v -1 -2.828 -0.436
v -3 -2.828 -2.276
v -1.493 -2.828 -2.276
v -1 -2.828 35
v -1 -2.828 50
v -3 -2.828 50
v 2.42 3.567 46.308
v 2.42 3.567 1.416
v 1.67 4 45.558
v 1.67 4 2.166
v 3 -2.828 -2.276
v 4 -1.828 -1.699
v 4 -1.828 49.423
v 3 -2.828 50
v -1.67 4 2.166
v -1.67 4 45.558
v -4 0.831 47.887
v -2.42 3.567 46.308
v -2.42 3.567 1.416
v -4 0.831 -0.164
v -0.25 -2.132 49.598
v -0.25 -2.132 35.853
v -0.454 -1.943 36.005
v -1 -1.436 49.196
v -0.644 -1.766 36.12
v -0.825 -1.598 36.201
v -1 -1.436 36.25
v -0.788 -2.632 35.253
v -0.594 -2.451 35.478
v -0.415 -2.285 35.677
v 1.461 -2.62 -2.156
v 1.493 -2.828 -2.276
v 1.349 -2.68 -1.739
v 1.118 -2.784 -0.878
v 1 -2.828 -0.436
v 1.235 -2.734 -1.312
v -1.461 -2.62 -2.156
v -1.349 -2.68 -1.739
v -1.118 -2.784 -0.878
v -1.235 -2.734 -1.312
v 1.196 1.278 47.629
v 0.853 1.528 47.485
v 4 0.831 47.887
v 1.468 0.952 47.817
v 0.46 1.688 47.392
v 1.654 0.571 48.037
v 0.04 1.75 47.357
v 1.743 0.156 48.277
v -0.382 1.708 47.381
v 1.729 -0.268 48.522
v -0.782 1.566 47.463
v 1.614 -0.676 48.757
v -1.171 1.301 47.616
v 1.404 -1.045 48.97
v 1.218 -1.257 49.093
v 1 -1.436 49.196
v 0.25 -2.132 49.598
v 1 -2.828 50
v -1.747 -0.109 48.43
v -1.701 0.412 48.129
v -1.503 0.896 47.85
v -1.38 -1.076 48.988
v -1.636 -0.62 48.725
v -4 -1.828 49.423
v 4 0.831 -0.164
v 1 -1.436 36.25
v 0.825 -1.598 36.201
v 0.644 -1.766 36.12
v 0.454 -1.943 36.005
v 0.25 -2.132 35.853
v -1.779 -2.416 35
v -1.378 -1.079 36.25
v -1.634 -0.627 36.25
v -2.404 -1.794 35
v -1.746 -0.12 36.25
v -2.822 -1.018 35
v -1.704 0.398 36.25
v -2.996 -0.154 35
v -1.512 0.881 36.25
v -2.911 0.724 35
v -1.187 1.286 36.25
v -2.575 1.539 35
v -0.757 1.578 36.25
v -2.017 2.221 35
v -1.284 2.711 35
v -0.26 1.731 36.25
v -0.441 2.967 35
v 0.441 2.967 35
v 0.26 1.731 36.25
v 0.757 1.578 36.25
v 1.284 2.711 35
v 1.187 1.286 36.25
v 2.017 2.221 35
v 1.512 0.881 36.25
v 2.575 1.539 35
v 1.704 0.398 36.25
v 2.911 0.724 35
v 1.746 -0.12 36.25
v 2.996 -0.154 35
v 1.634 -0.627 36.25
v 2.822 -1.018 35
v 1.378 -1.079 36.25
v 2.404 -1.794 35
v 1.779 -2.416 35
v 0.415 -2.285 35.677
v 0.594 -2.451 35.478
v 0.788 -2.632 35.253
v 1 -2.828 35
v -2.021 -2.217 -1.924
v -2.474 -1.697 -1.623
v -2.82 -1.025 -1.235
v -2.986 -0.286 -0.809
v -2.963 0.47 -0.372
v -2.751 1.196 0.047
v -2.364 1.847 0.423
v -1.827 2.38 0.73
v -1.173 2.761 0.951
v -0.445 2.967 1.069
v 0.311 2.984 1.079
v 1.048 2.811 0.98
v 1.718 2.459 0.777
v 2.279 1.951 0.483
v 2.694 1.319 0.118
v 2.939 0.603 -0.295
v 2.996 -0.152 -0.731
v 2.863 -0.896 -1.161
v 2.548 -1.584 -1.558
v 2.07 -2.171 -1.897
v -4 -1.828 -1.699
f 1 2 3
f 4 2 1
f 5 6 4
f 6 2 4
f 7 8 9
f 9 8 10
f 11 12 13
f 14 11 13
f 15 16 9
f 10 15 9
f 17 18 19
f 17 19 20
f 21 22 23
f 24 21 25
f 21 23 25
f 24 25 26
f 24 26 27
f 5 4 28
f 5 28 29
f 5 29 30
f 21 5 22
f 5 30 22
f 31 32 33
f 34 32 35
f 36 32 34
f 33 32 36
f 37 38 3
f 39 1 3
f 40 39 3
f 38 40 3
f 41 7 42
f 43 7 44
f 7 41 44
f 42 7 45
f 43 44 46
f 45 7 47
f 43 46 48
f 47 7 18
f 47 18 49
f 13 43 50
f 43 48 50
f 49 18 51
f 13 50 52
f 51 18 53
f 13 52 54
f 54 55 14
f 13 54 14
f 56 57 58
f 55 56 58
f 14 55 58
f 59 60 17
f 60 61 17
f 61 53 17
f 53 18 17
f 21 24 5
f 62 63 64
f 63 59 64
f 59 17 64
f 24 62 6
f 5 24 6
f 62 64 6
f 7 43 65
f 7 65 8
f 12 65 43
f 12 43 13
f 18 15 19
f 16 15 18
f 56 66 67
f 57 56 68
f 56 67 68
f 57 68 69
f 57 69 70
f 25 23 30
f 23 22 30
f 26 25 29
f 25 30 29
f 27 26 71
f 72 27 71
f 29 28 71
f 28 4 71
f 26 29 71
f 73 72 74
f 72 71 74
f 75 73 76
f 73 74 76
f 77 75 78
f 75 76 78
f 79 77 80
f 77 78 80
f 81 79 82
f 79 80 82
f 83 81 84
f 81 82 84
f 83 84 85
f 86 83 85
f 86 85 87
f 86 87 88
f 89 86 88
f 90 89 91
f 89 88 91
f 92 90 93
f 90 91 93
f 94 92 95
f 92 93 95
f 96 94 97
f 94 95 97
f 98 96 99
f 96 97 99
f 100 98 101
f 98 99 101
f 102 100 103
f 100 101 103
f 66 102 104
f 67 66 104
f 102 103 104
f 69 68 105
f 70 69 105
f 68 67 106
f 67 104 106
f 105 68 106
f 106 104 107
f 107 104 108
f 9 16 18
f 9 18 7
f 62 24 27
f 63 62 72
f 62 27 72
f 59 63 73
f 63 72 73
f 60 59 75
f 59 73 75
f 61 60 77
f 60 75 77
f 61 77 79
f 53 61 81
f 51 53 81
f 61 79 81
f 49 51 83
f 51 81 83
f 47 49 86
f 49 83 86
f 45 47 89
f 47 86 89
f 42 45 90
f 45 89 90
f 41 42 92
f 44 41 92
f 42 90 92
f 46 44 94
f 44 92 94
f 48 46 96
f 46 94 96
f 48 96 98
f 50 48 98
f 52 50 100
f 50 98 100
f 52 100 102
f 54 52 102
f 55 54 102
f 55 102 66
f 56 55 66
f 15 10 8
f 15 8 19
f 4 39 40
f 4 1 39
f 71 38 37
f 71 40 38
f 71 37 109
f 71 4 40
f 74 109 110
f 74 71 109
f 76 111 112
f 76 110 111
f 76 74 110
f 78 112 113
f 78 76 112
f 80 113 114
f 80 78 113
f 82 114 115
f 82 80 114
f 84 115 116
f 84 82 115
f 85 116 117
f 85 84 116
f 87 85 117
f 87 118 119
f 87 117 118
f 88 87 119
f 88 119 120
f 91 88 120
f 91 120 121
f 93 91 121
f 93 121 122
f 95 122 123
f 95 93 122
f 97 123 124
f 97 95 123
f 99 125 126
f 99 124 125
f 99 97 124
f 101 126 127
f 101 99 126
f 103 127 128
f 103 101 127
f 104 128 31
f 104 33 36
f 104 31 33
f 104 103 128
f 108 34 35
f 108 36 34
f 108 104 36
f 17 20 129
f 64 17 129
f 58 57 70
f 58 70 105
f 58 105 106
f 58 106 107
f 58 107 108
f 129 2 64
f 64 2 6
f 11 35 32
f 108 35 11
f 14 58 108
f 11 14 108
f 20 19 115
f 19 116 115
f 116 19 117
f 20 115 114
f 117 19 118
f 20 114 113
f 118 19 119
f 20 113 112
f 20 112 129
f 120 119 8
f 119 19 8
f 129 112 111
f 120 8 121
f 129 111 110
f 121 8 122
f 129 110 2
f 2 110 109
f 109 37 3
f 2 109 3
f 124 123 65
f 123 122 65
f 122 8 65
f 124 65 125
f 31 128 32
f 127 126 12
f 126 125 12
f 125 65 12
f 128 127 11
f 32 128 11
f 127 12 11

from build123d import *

# Parameters (mm, degrees)
F1_DEPTH  = 20
F2_DEPTH  = 15
F3_W      = 8
F3_H      = 0.1715728753
F4_DEPTH  = 35.001
F6_DEPTH  = 15
F7_SIZE   = 1.24999
F8_DEPTH  = 7.9
F9_W      = 8
F9_H      = 6.8284271247
F10_DEPTH = 3
F13_DEPTH = 3
F15_DEPTH = 8.001
F17_DEPTH = 60.901
F19_DEPTH = 8.001
F20_SIZE  = 1
F21_SIZE  = 0.5


# Not quite as in the source:
# - a fillet or chamfer is up to 0.001 mm smaller than in the source, because OpenCascade refuses the exact size


with BuildPart() as f1:
    # F0 (on Top) → F1 (new body)
    with BuildSketch(Plane.XY):
        with BuildLine():
            ThreePointArc((-1, -2.8284271247), (0, 3), (1, -2.8284271247))
            Line((1, -2.8284271247), (1, -3))
            Line((1, -3), (4, -3))
            Line((4, -3), (4, 4))
            Line((4, 4), (0, 4))
            Line((0, 4), (-4, 4))
            Line((-4, 4), (-4, -3))
            Line((-4, -3), (-1, -3))
            Line((-1, -3), (-1, -2.8284271247))
        make_face()
    extrude(amount=F1_DEPTH)

    # F2 (add): a face of the model
    f2_faces = [f1.faces().sort_by_distance(p)[0] for p in [
        (0, 3.1063014581, 20),
    ]]
    extrude(f2_faces, amount=F2_DEPTH)

    # F3 (on face) → F4 (cut, through all)
    with BuildSketch(Plane.XY.offset(35)):
        with Locations((0, -2.9142135624)):
            Rectangle(F3_W, F3_H)
    extrude(amount=-F4_DEPTH, mode=Mode.SUBTRACT)

    # F5 (on face) → F6 (join)
    with BuildSketch(Plane.XY.offset(35)):
        with BuildLine():
            ThreePointArc((-1, -1.4361406616), (0, 1.75), (1, -1.4361406616))
            Line((1, -1.4361406616), (0.25, -2.1322838932))
            Line((0.25, -2.1322838932), (1, -2.8284271247))
            Line((1, -2.8284271247), (4, -2.8284271247))
            Line((4, -2.8284271247), (4, 4))
            Line((4, 4), (-4, 4))
            Line((-4, 4), (-4, -2.8284271247))
            Line((-4, -2.8284271247), (-1, -2.8284271247))
            Line((-1, -2.8284271247), (-0.25, -2.1322838932))
            Line((-0.25, -2.1322838932), (-1, -1.4361406616))
        make_face()
    extrude(amount=F6_DEPTH)

    # F7 (size 1.25 in the source; OpenCascade refuses exactly that, so slightly less here)
    f7_edges = [f1.edges().sort_by_distance(p)[0] for p in [
        (0, 1.75, 35),
    ]]
    chamfer(f7_edges, length=F7_SIZE)

    # F8 (add): a face of the model
    f8_faces = [f1.faces().sort_by_distance(p)[0] for p in [
        (-2.5, -2.7232475559, 0),
    ]]
    extrude(f8_faces, amount=F8_DEPTH)

    # F9 (on face) → F10 (join)
    with BuildSketch(Plane(origin=(0, 0, -7.9), x_dir=(1, 0, 0), z_dir=(0, 0, -1))):
        with Locations((0, -0.5857864376)):
            Rectangle(F9_W, F9_H)
    extrude(amount=F10_DEPTH)

    # F12 (on face) → F13 (cut)
    with BuildSketch(Plane.XZ.offset(2.8284271247)):
        Polygon((0, 3.2961524227), (-3, -7.9), (1, -7.9), (3, -7.9), align=None)
    extrude(amount=-F13_DEPTH, mode=Mode.SUBTRACT)

    # F14 (on face) → F15 (cut, through all)
    with BuildSketch(Plane(origin=(-4, 0, 0), x_dir=(0, -1, 0), z_dir=(-1, 0, 0))):
        Polygon((-4, 46.0576057614), (2.8284271247, 50), (-4, 50), align=None)
    extrude(amount=-F15_DEPTH, mode=Mode.SUBTRACT)

    # F16 (on face) → F17 (cut, through all)
    with BuildSketch(Plane(origin=(0, 0, -10.9), x_dir=(1, 0, 0), z_dir=(0, 0, -1))):
        Polygon((4, -0.8309159426), (2.1703284663, -4), (4, -4), align=None)
        Polygon((-2.1703284663, -4), (-4, -0.8309159426), (-4, -4), align=None)
    extrude(amount=-F17_DEPTH, mode=Mode.SUBTRACT)

    # F18 (on face) → F19 (cut, through all)
    with BuildSketch(Plane.YZ.offset(4)):
        Polygon((4, 1.6660254038), (-2.8284271247, -2.2763688348), (-2.8284271247, -10.9), (4, -10.9), align=None)
    extrude(amount=-F19_DEPTH, mode=Mode.SUBTRACT)

    # F20
    f20_edges = [f1.edges().sort_by_distance(p)[0] for p in [
        (-4, -2.828427, 23.861816),
        (4, -2.828427, 23.861816),
    ]]
    chamfer(f20_edges, length=F20_SIZE)

    # F21
    f21_edges = [f1.edges().sort_by_distance(p)[0] for p in [
        (-2.170328, 4, 23.861816),
        (0, 4, 46.057606),
        (2.170328, 4, 23.861816),
        (0, 4, 1.666025),
    ]]
    chamfer(f21_edges, length=F21_SIZE)


solid = f1.part
